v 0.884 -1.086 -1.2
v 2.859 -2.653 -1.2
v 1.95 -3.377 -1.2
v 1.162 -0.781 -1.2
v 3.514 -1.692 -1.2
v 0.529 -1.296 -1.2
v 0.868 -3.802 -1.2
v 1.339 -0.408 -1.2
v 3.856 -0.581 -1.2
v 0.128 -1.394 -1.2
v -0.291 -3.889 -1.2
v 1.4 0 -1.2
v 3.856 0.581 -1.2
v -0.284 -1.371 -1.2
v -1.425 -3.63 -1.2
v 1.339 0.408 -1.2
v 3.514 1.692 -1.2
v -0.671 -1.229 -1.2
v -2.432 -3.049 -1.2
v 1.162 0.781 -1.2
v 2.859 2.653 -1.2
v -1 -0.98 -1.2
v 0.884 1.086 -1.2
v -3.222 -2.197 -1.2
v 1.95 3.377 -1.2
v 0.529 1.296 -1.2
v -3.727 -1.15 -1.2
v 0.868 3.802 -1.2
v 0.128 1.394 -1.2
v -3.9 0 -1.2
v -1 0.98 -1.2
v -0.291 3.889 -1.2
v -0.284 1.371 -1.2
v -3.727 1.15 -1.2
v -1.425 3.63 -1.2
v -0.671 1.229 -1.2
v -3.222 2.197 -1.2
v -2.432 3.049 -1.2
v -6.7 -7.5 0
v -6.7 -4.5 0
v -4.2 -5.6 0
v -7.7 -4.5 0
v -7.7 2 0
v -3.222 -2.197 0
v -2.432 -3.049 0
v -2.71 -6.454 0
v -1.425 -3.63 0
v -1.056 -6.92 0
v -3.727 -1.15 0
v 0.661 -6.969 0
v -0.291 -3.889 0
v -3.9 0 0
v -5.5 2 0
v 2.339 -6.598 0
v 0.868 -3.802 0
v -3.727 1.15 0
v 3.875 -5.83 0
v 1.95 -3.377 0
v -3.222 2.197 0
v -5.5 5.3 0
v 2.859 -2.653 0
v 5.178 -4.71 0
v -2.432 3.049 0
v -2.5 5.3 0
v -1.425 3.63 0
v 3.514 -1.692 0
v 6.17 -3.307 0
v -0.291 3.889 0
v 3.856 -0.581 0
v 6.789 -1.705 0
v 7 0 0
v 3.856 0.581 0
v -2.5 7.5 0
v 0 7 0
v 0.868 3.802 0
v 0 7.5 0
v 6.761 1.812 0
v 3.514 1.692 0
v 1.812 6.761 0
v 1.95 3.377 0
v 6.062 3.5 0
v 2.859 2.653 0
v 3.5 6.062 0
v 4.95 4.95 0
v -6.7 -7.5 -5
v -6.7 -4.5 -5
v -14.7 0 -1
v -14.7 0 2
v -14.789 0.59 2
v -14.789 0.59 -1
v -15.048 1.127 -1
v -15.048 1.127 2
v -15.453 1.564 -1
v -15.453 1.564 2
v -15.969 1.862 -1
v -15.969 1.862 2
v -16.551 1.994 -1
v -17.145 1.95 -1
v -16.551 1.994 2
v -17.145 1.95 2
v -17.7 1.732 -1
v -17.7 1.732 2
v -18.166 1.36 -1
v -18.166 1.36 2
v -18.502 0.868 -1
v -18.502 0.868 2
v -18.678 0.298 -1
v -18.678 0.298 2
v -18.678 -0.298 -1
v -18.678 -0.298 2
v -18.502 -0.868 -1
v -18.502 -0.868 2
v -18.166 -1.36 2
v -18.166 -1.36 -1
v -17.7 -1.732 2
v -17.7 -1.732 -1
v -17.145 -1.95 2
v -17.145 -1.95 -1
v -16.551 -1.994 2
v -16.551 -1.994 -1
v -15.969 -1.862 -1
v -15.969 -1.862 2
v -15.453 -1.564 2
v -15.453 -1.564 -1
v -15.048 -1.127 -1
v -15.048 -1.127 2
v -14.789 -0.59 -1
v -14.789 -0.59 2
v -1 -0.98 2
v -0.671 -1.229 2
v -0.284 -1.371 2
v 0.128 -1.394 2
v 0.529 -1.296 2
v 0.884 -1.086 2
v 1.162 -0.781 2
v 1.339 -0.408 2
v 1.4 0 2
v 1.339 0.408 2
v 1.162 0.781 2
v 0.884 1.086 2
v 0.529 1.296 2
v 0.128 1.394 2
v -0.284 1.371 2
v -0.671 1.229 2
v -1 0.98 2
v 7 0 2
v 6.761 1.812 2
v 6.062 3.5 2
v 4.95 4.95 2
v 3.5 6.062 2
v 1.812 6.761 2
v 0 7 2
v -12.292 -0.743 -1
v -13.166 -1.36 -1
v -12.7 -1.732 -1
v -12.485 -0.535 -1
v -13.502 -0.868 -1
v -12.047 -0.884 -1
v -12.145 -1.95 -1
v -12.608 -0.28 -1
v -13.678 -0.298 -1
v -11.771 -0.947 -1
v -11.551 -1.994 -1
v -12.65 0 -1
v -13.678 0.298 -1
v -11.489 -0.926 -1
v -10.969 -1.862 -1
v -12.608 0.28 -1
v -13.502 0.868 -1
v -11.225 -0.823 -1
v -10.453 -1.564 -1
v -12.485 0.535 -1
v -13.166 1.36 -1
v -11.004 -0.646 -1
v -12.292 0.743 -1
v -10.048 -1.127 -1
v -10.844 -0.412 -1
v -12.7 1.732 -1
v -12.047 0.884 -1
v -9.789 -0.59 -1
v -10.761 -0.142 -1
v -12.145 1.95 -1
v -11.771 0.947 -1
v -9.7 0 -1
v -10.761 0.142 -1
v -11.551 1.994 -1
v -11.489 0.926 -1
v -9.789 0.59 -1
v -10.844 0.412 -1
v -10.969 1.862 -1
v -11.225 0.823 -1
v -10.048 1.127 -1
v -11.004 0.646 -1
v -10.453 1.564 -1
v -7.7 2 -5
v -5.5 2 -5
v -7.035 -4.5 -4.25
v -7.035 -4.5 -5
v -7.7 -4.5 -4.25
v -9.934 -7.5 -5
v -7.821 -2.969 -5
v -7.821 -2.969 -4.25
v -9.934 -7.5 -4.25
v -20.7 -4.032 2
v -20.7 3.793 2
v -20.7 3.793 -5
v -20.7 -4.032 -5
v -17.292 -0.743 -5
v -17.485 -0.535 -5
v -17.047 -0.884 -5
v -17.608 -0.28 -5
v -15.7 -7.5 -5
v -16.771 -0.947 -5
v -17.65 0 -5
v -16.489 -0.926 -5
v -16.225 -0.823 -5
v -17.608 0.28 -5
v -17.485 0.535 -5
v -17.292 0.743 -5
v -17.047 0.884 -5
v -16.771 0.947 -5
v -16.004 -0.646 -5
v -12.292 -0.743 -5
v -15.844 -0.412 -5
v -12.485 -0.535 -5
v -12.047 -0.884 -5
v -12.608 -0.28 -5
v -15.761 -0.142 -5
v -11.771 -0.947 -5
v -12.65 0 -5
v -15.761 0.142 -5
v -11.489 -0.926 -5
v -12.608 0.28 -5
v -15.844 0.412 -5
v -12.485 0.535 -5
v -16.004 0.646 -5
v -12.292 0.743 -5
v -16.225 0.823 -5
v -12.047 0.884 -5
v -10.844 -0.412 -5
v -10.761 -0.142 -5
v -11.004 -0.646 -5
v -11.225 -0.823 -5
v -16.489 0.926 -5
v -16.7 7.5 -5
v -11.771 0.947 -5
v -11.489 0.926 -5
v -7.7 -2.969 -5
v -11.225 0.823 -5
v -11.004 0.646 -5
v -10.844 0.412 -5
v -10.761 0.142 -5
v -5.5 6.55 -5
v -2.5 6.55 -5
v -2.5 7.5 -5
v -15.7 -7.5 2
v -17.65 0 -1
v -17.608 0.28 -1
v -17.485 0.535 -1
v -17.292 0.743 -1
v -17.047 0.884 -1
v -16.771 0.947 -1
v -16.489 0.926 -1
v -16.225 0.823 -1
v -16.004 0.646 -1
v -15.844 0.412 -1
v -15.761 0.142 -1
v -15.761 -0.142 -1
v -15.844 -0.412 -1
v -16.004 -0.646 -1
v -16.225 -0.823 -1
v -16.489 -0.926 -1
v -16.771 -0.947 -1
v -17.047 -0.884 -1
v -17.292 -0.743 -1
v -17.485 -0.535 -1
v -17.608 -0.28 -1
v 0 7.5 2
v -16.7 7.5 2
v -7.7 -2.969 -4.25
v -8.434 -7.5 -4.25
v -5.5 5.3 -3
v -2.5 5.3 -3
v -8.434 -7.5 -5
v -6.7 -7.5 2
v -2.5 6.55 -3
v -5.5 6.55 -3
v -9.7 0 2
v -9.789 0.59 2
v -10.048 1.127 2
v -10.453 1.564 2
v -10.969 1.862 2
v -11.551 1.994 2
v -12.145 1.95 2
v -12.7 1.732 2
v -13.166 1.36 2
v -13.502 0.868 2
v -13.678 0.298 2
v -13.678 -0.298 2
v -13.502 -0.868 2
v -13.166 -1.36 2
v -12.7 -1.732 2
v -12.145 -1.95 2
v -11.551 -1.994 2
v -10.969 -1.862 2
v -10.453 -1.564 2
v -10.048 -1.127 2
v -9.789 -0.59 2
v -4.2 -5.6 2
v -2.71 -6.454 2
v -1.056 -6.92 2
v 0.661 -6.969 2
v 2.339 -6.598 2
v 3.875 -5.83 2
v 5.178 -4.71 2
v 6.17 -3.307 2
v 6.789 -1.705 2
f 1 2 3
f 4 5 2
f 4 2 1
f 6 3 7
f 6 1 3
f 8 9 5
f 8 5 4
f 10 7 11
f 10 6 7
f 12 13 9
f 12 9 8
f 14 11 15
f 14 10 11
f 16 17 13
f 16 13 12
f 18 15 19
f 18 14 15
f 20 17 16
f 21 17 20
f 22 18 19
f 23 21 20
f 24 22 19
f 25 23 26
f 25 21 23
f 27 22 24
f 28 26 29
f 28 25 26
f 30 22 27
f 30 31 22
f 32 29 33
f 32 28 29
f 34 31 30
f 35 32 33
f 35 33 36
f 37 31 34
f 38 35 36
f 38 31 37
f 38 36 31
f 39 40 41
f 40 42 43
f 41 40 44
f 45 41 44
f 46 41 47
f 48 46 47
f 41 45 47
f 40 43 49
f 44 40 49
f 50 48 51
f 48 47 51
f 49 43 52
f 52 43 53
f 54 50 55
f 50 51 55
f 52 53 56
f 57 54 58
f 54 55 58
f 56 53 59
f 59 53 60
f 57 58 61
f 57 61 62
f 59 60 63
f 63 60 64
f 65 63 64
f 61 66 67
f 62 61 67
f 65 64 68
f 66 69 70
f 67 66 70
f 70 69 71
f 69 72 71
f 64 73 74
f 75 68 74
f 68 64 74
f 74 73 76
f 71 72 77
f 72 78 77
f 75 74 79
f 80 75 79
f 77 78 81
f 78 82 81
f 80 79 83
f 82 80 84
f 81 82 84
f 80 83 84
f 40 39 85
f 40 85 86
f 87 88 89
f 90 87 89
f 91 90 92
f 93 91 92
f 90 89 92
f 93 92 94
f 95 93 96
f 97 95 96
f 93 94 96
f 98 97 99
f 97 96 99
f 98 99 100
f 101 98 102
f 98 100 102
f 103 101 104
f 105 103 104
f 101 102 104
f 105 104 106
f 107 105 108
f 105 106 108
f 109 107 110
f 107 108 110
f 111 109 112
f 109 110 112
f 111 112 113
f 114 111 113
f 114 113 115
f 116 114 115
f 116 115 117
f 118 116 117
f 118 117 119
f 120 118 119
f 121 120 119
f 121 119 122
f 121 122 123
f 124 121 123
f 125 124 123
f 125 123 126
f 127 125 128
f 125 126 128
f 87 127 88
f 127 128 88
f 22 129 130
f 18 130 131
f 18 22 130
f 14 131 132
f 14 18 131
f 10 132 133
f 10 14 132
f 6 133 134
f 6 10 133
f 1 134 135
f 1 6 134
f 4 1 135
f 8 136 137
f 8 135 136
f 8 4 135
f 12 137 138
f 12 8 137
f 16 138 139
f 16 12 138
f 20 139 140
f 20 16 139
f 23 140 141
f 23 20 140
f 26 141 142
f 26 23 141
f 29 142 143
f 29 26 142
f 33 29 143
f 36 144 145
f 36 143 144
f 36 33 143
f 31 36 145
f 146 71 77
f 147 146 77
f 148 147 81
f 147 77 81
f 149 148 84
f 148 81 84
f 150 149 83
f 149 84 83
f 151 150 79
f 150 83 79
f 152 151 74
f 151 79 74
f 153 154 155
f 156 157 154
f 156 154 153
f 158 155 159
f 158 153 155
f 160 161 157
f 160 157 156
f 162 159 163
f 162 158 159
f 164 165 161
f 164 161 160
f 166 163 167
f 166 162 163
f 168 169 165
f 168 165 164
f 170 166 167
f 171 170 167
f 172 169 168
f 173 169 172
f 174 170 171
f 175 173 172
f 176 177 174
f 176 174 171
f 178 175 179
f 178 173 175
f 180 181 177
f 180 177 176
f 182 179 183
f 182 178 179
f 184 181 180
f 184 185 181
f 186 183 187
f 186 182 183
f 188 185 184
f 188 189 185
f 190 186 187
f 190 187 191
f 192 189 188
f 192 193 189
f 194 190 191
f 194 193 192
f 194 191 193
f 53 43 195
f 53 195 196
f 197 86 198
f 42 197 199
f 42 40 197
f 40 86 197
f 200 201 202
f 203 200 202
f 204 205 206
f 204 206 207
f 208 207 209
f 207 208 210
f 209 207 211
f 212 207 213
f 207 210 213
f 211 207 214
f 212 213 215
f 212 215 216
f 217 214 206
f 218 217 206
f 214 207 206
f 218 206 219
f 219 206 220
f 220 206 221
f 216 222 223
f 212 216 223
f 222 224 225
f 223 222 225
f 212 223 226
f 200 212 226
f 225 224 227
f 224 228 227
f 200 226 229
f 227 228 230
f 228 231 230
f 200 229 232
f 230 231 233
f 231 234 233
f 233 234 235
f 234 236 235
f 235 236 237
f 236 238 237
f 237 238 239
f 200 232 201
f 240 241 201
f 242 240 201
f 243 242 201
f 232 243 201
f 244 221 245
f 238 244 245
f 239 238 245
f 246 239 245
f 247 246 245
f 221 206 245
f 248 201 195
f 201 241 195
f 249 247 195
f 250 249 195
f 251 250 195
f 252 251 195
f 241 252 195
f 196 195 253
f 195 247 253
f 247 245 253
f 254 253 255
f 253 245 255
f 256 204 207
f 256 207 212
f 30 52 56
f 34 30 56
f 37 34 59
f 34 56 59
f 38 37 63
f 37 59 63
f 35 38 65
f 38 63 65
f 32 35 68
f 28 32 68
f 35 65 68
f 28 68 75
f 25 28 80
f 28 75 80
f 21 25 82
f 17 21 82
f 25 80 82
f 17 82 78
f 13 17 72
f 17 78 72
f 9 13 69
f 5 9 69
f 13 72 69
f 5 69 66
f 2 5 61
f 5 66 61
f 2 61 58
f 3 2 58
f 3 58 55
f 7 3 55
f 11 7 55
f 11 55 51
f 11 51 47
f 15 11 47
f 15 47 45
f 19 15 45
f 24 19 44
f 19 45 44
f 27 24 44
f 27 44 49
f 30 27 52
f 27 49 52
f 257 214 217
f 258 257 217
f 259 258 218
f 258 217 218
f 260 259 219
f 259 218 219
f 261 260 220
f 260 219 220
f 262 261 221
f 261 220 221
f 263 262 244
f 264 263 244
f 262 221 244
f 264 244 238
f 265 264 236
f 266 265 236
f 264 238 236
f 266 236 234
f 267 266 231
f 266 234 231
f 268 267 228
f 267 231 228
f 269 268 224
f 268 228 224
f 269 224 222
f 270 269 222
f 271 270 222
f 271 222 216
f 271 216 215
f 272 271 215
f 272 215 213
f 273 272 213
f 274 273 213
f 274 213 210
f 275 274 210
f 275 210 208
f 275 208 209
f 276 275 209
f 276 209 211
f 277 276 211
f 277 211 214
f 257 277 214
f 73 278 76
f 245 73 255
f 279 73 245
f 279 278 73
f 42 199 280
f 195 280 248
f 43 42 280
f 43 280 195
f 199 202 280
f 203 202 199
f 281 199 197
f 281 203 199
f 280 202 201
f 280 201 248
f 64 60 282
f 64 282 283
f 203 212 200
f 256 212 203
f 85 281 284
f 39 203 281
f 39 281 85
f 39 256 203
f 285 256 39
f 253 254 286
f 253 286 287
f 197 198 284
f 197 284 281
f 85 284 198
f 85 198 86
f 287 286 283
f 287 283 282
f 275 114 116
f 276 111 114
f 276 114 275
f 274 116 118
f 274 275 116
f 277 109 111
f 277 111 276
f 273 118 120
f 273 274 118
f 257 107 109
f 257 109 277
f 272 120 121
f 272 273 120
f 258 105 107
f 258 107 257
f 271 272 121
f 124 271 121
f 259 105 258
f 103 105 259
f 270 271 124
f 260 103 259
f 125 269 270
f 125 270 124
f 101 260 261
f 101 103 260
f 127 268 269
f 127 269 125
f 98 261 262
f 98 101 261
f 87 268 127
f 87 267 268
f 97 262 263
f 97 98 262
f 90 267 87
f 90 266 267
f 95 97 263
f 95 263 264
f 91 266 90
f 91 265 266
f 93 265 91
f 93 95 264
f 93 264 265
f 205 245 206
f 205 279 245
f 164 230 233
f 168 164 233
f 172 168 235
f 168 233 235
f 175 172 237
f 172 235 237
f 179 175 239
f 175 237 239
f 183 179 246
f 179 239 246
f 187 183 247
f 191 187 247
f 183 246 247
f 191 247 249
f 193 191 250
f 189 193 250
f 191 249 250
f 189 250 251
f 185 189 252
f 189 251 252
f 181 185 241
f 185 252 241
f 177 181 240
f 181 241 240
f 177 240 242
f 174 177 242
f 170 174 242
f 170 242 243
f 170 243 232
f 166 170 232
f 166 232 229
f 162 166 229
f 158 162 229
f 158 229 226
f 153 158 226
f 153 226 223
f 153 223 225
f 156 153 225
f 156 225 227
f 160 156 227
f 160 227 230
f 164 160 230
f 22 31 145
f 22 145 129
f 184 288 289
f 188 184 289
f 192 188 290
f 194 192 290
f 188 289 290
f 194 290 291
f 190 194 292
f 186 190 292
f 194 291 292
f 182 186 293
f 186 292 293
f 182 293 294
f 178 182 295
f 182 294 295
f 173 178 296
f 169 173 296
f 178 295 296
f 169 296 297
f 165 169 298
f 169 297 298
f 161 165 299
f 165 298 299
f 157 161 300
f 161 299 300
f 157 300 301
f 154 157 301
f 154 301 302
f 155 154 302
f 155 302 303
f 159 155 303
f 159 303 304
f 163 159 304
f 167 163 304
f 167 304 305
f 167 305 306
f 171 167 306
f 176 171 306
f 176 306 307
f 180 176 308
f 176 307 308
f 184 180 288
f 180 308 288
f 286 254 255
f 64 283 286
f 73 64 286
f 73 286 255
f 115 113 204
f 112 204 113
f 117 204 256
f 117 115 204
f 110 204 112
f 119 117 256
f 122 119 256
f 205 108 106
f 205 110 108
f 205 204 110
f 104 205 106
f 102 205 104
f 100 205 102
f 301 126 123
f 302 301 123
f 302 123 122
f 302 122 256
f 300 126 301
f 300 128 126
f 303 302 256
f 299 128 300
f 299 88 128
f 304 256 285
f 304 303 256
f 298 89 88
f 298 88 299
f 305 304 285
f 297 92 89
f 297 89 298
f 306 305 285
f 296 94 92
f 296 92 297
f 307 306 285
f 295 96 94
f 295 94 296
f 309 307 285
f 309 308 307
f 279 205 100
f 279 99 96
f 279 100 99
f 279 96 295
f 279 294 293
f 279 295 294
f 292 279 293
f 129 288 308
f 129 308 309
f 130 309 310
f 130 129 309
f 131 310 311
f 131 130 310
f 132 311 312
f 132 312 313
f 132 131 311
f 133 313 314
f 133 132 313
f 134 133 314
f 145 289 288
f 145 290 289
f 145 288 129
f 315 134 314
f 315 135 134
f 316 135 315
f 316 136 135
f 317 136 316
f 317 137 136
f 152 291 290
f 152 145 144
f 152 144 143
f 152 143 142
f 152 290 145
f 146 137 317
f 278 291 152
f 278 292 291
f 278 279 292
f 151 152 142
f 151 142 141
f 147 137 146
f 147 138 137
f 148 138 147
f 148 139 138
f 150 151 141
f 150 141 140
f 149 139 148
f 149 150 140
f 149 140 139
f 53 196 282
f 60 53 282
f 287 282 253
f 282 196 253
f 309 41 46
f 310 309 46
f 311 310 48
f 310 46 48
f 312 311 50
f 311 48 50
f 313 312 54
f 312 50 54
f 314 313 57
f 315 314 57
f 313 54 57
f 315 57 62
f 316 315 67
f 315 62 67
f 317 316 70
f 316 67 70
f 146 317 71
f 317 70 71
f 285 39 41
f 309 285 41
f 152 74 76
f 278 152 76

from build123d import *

# Parameters (mm, degrees)
BOSS_EXTRUDE1_DEPTH = 2
BOSS_EXTRUDE2_DEPTH = 5
SKETCH4_R           = 3.9
BOSS_EXTRUDE3_DEPTH = 1.2
CUT_EXTRUDE1_DEPTH  = 5
SKETCH7_W           = 1.5
SKETCH7_H           = 1.5
CUT_EXTRUDE2_DEPTH  = 5
SKETCH8_R           = 0.95
CUT_EXTRUDE3_DEPTH  = 8
SKETCH9_R           = 2
CUT_EXTRUDE4_DEPTH  = 3
SKETCH10_W          = 3
SKETCH10_H          = 1.25
CUT_EXTRUDE5_DEPTH  = 2


with BuildPart() as part:
    # Sketch1 → Boss-Extrude1 (new body)
    with BuildSketch(Plane.XY):
        with BuildLine():
            Line((-20.7, 3.793442666), (-20.7, -4.031648778))
            Line((-20.7, -4.031648778), (-15.7, -7.5))
            Line((-15.7, -7.5), (-6.7, -7.5))
            Line((-6.7, -7.5), (-4.2, -5.6))
            ThreePointArc((-4.2, -5.6), (3.130495168, -6.260990337), (7, 0))
            ThreePointArc((7, 0), (4.949747468, 4.949747468), (0, 7))
            Line((0, 7), (0, 7.5))
            Line((0, 7.5), (-16.7, 7.5))
            Line((-16.7, 7.5), (-20.7, 3.793442666))
        make_face()
    extrude(amount=BOSS_EXTRUDE1_DEPTH)

    # Sketch2 → Boss-Extrude2 (add)
    with BuildSketch(Plane(origin=(0, 0, 0), x_dir=(-1, 0, 0), z_dir=(0, 0, -1))):
        Polygon((16.7, 7.5), (20.7, 3.793442666), (20.7, -4.031648778), (15.7, -7.5), (6.7, -7.5), (6.7, -4.5), (7.7, -4.5), (7.7, 2), (5.5, 2), (5.5, 5.3), (2.5, 5.3), (2.5, 7.5), align=None)
    extrude(amount=BOSS_EXTRUDE2_DEPTH)

    # Sketch4 → Boss-Extrude3 (add)
    with BuildSketch(Plane(origin=(0, 0, 0), x_dir=(-1, 0, 0), z_dir=(0, 0, -1))):
        Circle(SKETCH4_R)
    extrude(amount=BOSS_EXTRUDE3_DEPTH)

    # Sketch5 → Cut-Extrude1 (cut)
    with BuildSketch(Plane(origin=(0, 0, -1.2), x_dir=(-1, 0, 0), z_dir=(0, 0, -1))):
        with BuildLine():
            Line((1, 0.979795897), (1, -0.979795897))
            ThreePointArc((1, -0.979795897), (-1.4, 0), (1, 0.979795897))
        make_face()
    extrude(amount=-CUT_EXTRUDE1_DEPTH, mode=Mode.SUBTRACT)

    # Sketch7 → Cut-Extrude2 (cut, along a direction that is not the sketch's normal)
    with BuildSketch(Plane.XZ.offset(7.5)):
        with Locations((-9.184228352, -5)):
            Rectangle(SKETCH7_W, SKETCH7_H)
    extrude(amount=-CUT_EXTRUDE2_DEPTH, dir=(-0.422651734, -0.906292178, 0), mode=Mode.SUBTRACT)

    # Sketch8 → Cut-Extrude3 (cut)
    with BuildSketch(Plane(origin=(0, 0, -5), x_dir=(-1, 0, 0), z_dir=(0, 0, -1))):
        with Locations((16.7, 0)):
            Circle(SKETCH8_R)
        with Locations((11.7, 0)):
            Circle(SKETCH8_R)
    extrude(amount=-CUT_EXTRUDE3_DEPTH, mode=Mode.SUBTRACT)

    # Sketch9 → Cut-Extrude4 (cut)
    with BuildSketch(Plane.XY.offset(2)):
        with Locations((-16.7, 0)):
            Circle(SKETCH9_R)
        with Locations((-11.7, 0)):
            Circle(SKETCH9_R)
    extrude(amount=-CUT_EXTRUDE4_DEPTH, mode=Mode.SUBTRACT)

    # Sketch10 → Cut-Extrude5 (cut)
    with BuildSketch(Plane(origin=(0, 0, -5), x_dir=(-1, 0, 0), z_dir=(0, 0, -1))):
        with Locations((4, 5.925)):
            Rectangle(SKETCH10_W, SKETCH10_H)
    extrude(amount=-CUT_EXTRUDE5_DEPTH, mode=Mode.SUBTRACT)


solid = part.part
